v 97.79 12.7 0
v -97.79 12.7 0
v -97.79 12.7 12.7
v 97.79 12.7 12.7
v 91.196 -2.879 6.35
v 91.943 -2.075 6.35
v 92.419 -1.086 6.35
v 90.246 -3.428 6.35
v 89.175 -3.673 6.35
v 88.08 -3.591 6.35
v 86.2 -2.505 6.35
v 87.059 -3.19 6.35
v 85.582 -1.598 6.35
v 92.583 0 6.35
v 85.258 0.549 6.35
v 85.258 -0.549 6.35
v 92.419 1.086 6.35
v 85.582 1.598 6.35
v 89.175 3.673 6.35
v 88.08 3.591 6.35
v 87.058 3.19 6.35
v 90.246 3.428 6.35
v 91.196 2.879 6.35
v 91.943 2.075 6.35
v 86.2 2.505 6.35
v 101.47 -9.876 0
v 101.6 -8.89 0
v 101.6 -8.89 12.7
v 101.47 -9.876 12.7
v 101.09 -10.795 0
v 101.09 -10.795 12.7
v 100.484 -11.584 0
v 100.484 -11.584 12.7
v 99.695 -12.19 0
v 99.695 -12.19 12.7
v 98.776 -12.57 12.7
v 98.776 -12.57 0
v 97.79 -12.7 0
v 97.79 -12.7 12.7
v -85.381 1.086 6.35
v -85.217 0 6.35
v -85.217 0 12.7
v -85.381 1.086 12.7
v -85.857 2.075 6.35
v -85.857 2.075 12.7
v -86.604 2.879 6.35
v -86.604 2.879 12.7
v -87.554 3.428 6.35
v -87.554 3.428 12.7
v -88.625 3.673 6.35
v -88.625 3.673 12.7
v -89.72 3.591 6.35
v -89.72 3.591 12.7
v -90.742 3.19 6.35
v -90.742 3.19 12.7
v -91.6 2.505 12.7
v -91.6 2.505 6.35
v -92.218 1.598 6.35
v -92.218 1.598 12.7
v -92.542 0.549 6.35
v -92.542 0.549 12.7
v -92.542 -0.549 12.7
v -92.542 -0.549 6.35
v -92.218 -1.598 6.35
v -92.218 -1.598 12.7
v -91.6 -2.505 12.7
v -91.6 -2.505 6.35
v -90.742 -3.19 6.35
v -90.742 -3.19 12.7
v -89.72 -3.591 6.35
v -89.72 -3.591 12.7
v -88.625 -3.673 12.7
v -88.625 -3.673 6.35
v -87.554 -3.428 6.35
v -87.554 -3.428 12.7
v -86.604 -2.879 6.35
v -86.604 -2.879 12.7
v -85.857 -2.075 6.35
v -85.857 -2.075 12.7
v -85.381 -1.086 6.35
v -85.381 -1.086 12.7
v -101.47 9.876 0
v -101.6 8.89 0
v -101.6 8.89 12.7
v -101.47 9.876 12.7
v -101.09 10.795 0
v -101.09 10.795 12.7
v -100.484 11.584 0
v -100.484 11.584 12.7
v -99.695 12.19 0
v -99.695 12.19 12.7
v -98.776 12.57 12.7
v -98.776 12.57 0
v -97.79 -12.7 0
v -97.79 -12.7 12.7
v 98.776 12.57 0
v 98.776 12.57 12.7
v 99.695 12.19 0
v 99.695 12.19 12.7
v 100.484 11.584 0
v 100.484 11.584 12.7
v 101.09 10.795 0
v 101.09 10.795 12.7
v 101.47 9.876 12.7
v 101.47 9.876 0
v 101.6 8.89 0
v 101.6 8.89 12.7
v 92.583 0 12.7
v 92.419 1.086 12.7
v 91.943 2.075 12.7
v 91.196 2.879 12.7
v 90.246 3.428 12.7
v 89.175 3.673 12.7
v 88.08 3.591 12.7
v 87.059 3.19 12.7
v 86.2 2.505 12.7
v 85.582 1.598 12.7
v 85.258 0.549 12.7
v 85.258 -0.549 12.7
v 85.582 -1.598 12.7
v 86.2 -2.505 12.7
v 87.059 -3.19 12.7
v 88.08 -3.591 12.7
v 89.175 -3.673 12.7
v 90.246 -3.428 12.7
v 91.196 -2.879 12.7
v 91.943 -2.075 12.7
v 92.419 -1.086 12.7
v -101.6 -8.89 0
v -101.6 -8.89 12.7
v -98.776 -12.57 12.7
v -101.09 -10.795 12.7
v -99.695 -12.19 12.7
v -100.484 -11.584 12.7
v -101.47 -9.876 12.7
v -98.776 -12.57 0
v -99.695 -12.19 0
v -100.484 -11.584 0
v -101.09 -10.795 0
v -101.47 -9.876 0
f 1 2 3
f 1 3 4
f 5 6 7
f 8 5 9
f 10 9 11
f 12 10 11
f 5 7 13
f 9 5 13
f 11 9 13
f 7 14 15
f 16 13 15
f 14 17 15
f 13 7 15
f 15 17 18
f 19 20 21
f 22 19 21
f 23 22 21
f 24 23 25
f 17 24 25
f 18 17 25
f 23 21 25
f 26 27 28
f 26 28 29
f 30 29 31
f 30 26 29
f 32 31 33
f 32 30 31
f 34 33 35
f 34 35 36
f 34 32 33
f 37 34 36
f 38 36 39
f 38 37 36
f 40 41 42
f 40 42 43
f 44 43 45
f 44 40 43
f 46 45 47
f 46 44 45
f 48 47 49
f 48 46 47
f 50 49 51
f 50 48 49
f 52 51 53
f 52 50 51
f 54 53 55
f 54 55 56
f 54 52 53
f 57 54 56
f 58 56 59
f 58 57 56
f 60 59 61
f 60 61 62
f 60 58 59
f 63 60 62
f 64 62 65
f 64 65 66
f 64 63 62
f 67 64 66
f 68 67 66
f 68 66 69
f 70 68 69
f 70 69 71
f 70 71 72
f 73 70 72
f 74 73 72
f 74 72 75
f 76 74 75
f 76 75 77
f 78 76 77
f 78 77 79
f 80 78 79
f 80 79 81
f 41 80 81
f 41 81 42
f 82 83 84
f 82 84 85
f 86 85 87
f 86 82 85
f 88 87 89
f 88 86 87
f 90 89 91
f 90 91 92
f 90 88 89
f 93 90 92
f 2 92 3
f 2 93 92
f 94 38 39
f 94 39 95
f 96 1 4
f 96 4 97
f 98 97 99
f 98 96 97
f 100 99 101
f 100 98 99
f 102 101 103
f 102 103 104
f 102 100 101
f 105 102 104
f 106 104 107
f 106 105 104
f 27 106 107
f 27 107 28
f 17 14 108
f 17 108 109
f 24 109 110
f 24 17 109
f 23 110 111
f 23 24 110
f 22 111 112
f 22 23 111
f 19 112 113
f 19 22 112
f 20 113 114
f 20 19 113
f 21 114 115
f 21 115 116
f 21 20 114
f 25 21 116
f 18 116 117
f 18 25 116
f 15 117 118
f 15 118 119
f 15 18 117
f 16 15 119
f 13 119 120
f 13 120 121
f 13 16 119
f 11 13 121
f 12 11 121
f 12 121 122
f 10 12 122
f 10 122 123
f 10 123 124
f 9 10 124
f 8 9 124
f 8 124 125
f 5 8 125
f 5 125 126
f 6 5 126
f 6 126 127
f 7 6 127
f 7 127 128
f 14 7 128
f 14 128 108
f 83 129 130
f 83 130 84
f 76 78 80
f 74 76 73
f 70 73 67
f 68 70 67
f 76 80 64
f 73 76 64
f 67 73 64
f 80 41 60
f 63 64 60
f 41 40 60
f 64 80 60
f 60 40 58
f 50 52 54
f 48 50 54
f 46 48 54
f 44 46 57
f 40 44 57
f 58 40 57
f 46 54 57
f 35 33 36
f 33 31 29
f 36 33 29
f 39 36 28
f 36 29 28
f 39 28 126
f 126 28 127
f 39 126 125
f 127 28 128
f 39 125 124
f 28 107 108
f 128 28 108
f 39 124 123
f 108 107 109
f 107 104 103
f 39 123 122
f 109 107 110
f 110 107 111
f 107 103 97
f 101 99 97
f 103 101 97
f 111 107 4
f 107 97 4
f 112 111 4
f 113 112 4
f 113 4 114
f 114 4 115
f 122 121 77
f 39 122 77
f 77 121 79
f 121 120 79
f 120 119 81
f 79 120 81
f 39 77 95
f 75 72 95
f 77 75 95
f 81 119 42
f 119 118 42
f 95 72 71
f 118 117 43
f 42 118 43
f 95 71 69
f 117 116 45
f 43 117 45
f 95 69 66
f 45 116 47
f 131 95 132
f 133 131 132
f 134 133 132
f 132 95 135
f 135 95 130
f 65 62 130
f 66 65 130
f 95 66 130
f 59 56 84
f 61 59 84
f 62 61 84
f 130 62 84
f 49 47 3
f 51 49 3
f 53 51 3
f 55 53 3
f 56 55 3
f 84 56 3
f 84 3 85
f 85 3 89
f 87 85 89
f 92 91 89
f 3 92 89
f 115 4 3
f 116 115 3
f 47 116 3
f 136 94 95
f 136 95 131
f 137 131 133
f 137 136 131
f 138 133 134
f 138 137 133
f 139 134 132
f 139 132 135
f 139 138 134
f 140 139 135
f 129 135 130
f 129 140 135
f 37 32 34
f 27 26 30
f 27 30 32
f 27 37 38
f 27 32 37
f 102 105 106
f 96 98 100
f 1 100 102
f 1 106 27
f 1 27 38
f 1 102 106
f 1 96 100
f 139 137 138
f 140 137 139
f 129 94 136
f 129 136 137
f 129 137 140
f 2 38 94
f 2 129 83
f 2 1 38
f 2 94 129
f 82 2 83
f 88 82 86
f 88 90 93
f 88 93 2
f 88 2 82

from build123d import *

# Parameters (mm, degrees)
SKETCH1_R           = 3.683
BOSS_EXTRUDE1_DEPTH = 12.7
SKETCH2_R           = 3.683
BOSS_EXTRUDE2_DEPTH = 6.35


with BuildPart() as part:
    # Sketch1 → Boss-Extrude1 (new body)
    with BuildSketch(Plane.XY):
        with BuildLine():
            Line((97.79, -12.7), (-97.79, -12.7))
            ThreePointArc((-97.79, -12.7), (-100.484076836, -11.584076836), (-101.6, -8.89))
            Line((-101.6, -8.89), (-101.6, 8.89))
            ThreePointArc((-101.6, 8.89), (-100.484076836, 11.584076836), (-97.79, 12.7))
            Line((-97.79, 12.7), (97.79, 12.7))
            ThreePointArc((97.79, 12.7), (100.484076836, 11.584076836), (101.6, 8.89))
            Line((101.6, 8.89), (101.6, -8.89))
            ThreePointArc((101.6, -8.89), (100.484076836, -11.584076836), (97.79, -12.7))
        make_face()
        with Locations((-88.9, 0)):
            Circle(SKETCH1_R, mode=Mode.SUBTRACT)
        with Locations((88.9, 0)):
            Circle(SKETCH1_R, mode=Mode.SUBTRACT)
    extrude(amount=BOSS_EXTRUDE1_DEPTH)

    # Sketch2 → Boss-Extrude2 (add)
    with BuildSketch(Plane(origin=(0, 0, 0), x_dir=(-1, 0, 0), z_dir=(0, 0, -1))):
        with Locations((-88.9, 0)):
            Circle(SKETCH2_R)
        with Locations((88.9, 0)):
            Circle(SKETCH2_R)
    extrude(amount=-BOSS_EXTRUDE2_DEPTH)


solid = part.part
